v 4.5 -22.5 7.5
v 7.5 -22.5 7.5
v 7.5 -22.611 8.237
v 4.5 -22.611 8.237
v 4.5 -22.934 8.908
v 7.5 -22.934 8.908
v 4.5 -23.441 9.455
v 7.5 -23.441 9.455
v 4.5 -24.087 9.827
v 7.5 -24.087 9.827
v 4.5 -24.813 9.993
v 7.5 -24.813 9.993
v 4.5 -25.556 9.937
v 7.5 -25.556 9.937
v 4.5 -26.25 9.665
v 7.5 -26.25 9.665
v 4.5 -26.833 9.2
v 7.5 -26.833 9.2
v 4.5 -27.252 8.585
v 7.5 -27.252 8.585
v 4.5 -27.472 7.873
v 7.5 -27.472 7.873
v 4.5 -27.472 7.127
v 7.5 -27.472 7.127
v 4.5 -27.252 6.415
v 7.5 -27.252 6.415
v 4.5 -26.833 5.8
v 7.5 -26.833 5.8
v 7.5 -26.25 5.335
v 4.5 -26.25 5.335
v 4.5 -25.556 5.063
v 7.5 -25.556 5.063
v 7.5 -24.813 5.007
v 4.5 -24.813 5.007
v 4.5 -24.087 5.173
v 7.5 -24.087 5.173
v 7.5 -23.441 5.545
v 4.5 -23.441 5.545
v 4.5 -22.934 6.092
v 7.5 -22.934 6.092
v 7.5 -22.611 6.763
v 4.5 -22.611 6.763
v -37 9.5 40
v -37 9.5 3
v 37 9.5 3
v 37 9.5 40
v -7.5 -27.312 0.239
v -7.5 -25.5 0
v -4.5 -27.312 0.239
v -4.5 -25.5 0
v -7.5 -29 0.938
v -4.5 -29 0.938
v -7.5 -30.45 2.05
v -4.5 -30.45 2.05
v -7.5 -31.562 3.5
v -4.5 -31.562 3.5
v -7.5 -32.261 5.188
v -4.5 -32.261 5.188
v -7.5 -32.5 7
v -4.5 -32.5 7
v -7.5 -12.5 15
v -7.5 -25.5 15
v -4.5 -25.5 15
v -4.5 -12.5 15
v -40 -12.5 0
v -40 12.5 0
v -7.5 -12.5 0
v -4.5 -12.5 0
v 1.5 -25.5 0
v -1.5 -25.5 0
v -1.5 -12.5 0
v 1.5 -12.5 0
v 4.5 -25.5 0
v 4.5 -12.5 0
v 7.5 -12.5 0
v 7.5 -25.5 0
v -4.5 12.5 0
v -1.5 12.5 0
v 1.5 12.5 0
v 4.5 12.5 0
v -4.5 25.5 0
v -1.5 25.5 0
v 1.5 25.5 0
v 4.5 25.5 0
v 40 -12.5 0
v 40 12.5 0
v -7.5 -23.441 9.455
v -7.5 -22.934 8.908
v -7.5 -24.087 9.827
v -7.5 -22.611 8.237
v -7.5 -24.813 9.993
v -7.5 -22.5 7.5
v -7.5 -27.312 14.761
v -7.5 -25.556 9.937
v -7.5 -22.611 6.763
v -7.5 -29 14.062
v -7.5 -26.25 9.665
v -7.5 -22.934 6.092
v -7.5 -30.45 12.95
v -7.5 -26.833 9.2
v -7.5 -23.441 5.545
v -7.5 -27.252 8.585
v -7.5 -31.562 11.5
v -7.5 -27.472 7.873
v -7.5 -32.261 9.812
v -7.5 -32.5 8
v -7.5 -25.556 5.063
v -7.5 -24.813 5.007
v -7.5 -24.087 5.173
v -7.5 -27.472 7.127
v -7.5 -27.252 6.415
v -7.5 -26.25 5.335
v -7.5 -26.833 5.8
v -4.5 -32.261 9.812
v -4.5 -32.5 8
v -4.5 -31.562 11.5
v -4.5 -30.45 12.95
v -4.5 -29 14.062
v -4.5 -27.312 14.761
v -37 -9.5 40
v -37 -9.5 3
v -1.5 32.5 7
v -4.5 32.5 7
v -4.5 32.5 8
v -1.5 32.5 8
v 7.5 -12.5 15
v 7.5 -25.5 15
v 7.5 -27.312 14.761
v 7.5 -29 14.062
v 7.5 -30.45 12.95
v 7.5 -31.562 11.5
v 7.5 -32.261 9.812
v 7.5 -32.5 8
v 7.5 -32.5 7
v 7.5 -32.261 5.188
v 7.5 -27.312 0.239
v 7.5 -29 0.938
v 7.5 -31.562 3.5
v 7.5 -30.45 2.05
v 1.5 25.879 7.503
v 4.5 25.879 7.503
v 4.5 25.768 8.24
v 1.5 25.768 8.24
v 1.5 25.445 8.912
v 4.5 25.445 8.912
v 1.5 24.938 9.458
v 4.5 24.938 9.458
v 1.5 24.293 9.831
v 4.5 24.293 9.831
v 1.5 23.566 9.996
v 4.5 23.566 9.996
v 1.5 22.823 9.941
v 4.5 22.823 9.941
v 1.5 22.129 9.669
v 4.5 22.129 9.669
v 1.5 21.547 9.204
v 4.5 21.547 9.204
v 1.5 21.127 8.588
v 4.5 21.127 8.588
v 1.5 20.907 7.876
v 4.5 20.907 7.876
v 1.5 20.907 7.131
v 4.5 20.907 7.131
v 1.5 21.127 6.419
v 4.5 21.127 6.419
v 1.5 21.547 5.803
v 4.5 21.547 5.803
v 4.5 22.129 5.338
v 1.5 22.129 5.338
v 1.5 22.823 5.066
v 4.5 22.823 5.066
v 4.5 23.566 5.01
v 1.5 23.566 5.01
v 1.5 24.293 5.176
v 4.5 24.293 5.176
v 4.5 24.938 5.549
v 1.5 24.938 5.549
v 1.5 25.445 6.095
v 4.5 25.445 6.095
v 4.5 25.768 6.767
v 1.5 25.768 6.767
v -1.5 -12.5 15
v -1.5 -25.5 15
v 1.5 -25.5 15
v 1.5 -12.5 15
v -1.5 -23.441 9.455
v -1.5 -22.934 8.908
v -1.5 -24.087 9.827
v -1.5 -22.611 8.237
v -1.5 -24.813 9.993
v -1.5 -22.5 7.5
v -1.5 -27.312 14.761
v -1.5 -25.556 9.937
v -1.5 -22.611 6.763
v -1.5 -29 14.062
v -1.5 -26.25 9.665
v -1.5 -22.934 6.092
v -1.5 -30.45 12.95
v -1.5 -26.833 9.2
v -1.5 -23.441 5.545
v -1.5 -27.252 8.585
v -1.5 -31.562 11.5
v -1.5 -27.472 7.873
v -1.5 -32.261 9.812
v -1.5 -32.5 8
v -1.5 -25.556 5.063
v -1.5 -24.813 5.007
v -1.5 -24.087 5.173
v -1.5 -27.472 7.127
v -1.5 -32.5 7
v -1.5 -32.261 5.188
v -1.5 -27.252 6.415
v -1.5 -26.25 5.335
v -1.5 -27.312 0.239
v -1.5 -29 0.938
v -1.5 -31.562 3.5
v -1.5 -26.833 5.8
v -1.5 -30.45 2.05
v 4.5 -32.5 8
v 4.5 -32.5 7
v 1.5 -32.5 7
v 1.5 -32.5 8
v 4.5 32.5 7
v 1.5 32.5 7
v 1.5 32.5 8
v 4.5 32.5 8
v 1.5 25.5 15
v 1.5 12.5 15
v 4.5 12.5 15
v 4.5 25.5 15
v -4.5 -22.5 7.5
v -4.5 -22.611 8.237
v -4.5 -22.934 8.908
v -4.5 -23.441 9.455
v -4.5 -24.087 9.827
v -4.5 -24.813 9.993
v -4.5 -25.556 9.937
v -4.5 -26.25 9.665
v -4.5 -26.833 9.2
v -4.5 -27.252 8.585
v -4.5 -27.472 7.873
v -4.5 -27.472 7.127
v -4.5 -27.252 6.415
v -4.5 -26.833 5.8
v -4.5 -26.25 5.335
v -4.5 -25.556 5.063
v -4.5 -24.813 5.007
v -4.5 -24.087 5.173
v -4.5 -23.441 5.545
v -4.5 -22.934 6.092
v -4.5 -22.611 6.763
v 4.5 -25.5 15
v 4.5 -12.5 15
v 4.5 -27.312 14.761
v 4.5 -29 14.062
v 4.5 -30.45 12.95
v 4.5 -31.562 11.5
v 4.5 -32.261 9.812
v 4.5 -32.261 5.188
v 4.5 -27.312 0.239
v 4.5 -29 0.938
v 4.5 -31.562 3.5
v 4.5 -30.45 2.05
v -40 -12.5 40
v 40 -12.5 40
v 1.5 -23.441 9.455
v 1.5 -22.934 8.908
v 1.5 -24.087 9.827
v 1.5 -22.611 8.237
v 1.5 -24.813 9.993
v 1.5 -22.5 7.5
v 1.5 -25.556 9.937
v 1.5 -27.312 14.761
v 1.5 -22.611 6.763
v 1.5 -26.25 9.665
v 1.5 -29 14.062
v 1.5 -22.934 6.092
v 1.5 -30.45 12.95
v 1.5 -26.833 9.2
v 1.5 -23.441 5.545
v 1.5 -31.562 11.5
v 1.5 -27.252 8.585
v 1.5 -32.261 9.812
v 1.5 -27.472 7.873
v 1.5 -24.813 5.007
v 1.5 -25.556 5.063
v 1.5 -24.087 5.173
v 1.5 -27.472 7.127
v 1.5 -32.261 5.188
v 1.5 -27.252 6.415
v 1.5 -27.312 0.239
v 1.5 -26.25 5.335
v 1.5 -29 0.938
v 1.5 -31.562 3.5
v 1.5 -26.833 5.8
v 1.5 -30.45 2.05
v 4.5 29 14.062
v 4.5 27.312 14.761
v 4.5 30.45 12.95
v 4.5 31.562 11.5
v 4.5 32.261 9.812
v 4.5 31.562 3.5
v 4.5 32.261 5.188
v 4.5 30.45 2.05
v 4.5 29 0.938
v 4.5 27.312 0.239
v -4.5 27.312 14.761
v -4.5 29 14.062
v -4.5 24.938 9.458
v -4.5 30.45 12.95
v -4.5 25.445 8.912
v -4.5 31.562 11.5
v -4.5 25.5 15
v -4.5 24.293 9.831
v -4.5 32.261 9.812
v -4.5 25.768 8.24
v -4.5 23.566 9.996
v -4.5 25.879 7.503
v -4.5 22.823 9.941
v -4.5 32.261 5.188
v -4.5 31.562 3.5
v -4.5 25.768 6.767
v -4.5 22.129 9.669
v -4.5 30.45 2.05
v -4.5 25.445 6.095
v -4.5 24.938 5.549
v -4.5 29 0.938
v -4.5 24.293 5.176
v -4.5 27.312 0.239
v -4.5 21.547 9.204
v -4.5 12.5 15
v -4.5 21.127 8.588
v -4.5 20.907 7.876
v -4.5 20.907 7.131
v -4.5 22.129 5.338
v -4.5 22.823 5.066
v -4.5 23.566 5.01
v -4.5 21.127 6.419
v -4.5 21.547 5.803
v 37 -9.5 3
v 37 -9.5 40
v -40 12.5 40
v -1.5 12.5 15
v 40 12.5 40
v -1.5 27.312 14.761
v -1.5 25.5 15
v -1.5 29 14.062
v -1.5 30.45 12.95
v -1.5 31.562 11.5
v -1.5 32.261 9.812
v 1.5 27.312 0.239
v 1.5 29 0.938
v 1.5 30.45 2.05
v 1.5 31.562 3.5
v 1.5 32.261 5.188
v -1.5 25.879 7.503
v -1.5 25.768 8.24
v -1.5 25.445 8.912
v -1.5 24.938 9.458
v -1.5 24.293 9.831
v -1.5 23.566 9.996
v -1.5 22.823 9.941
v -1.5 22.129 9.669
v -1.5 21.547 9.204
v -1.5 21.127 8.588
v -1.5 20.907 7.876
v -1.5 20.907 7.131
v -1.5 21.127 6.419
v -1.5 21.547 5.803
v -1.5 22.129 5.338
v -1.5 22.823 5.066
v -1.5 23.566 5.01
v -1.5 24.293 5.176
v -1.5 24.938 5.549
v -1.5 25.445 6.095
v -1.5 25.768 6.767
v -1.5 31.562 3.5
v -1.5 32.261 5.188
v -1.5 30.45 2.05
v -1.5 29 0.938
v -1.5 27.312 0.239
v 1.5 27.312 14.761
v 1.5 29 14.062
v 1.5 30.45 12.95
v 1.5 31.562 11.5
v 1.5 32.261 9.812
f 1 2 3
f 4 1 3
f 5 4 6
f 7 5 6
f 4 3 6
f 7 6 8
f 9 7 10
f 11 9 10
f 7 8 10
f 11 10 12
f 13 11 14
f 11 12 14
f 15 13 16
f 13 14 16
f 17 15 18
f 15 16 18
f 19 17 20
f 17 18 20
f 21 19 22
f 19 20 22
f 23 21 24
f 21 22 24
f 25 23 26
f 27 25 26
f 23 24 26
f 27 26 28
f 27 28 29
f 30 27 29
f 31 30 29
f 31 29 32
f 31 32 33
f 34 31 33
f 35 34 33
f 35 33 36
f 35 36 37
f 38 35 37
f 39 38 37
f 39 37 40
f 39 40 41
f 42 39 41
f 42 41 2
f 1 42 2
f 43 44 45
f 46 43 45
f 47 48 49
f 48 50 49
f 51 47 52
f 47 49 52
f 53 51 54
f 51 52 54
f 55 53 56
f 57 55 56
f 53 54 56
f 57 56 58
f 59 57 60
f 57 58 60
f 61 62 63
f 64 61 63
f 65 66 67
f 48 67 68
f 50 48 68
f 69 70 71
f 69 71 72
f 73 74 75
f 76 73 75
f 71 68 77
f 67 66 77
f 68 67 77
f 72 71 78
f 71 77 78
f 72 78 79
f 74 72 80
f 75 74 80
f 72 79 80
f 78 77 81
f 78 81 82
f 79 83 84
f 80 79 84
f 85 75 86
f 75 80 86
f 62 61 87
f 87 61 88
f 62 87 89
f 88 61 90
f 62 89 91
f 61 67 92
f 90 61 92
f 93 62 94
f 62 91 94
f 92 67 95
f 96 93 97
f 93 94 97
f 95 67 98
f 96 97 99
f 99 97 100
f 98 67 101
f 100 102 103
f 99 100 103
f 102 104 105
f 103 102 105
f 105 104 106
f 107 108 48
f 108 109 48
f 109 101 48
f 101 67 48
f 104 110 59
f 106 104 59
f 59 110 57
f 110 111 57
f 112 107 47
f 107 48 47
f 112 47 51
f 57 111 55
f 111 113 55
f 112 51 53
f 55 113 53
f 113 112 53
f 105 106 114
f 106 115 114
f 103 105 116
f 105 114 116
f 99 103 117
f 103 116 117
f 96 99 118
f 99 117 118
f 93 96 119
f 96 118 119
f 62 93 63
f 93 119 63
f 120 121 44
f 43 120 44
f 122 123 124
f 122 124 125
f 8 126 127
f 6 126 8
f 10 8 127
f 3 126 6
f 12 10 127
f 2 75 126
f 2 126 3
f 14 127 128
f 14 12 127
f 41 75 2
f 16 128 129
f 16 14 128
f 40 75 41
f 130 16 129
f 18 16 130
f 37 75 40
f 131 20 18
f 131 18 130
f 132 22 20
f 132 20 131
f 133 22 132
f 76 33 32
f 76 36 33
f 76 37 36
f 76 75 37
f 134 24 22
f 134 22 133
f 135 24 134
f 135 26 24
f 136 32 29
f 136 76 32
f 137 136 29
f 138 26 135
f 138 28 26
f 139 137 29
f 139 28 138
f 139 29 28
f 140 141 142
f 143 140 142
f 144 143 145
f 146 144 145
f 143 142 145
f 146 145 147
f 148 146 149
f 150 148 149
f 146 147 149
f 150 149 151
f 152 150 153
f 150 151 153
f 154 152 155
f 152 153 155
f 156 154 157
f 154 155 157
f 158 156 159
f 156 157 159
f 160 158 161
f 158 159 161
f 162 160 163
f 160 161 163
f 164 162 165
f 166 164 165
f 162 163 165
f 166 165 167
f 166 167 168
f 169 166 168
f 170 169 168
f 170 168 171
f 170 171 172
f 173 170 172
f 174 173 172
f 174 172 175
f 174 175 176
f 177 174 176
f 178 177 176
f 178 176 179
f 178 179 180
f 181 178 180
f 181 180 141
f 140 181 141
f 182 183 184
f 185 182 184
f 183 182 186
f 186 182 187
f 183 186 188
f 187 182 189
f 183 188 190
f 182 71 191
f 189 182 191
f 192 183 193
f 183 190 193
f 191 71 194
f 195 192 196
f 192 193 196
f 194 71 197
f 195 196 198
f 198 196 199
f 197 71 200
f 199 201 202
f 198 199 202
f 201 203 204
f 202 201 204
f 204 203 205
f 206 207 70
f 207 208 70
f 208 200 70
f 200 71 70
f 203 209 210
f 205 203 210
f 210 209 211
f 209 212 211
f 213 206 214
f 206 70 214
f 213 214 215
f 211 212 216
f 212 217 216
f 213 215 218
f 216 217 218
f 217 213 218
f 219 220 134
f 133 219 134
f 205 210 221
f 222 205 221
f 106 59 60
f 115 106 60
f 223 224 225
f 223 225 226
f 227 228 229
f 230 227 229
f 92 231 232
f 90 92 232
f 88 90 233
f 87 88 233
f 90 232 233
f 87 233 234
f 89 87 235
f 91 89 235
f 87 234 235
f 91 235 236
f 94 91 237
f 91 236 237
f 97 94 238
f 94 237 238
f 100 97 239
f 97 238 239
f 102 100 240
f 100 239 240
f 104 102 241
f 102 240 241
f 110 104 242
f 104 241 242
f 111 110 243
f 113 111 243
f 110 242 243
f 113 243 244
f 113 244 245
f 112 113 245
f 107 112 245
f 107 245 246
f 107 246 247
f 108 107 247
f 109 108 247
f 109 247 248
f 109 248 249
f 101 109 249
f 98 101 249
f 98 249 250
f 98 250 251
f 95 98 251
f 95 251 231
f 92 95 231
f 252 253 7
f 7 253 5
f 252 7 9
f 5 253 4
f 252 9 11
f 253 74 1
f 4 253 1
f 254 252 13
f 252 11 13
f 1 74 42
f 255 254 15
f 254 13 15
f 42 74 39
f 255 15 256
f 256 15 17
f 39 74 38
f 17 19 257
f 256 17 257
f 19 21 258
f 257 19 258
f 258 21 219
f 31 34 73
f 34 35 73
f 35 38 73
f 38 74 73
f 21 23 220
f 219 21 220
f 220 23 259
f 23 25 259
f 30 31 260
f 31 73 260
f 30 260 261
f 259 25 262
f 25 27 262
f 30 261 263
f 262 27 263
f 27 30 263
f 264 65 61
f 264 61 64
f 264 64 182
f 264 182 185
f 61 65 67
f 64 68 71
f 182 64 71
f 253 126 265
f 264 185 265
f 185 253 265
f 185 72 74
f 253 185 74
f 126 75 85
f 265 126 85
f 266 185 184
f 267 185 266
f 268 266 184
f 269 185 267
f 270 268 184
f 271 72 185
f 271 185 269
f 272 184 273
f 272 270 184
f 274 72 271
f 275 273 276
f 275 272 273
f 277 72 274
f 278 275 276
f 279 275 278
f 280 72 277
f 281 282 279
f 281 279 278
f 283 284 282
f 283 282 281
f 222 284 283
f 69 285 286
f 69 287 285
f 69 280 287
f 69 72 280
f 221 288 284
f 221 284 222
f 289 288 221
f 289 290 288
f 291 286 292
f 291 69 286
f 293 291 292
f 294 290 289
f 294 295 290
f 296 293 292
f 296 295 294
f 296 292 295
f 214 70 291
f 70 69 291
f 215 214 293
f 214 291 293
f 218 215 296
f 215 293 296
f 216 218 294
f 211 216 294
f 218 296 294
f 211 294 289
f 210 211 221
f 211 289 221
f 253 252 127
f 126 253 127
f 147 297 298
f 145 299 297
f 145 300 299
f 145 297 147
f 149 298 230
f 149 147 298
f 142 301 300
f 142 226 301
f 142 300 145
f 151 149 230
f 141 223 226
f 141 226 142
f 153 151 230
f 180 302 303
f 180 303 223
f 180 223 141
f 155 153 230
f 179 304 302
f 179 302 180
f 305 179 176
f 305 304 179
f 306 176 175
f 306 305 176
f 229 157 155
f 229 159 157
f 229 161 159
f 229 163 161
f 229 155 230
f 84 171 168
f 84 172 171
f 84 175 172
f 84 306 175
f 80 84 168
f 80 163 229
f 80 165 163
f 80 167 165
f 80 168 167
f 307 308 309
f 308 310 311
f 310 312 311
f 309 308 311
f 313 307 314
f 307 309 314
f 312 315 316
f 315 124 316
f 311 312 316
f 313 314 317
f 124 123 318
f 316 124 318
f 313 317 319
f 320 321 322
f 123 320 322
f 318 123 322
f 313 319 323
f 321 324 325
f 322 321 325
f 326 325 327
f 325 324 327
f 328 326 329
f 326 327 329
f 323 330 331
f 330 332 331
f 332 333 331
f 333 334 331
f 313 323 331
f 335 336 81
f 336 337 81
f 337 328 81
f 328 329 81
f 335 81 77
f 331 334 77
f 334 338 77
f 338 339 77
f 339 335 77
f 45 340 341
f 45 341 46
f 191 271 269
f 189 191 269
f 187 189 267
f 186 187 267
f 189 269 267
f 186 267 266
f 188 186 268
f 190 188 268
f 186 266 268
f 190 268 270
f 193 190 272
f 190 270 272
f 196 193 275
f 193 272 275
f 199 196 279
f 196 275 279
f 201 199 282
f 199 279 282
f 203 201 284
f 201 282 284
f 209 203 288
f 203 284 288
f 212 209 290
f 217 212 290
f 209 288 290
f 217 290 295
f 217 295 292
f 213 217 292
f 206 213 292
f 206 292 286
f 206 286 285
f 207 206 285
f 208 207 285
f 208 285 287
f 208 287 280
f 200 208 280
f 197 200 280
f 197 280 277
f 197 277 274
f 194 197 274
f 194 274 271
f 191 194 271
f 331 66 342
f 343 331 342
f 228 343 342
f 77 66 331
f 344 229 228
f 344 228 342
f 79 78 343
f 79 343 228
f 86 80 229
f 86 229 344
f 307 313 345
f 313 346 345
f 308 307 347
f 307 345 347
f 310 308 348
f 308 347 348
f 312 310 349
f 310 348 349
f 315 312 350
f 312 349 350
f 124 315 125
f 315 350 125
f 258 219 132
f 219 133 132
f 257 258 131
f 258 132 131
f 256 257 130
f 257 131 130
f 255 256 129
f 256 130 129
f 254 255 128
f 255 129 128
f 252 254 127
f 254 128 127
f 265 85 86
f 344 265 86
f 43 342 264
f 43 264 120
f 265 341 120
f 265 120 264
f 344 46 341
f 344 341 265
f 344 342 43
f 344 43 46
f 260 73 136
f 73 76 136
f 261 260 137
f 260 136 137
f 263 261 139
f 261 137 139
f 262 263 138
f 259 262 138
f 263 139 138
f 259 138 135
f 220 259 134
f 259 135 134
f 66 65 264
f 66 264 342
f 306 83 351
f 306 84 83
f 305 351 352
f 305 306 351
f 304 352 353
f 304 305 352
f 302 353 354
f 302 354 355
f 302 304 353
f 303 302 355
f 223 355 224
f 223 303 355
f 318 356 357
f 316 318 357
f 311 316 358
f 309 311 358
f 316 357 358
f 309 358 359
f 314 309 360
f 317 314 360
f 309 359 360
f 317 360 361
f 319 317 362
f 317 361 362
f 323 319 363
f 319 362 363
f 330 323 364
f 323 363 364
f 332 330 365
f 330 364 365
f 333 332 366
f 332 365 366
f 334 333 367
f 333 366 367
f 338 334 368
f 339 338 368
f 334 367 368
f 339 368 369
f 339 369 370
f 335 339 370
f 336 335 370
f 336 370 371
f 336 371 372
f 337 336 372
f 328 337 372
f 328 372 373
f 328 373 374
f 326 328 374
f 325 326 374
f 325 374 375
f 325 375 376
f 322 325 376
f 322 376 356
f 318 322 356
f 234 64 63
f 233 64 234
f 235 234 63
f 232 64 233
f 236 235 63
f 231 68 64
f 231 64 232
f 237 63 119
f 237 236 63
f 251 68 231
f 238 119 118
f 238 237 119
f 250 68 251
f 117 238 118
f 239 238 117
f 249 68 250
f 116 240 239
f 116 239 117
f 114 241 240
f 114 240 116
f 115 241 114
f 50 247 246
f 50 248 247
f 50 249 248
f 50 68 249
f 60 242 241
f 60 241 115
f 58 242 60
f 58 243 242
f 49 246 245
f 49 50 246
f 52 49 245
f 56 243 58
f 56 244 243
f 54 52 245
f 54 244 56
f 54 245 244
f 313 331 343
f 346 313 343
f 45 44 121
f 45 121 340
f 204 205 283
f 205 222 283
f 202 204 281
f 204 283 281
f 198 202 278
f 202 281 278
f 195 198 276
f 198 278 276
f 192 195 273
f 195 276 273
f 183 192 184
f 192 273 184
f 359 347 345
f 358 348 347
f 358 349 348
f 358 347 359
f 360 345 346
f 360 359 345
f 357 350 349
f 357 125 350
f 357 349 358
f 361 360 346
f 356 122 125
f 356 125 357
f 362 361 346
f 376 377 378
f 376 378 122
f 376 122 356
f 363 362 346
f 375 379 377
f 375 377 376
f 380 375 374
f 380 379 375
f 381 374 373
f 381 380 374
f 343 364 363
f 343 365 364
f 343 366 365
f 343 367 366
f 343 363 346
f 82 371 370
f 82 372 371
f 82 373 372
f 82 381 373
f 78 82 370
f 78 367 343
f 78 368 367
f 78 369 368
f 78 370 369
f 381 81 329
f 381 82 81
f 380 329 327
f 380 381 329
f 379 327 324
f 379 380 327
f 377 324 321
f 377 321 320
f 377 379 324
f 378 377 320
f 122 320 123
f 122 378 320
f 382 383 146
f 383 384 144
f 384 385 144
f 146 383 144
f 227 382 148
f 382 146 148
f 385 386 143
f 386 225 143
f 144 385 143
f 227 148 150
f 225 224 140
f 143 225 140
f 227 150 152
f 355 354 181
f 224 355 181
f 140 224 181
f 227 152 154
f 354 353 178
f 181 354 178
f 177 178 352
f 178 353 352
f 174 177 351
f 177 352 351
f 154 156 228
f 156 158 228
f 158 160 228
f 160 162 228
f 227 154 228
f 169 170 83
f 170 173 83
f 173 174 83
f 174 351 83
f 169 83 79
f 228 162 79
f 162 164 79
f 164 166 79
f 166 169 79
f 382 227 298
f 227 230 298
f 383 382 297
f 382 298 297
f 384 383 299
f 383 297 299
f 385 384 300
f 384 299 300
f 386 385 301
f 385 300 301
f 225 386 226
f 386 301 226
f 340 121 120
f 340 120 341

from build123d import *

# Parameters (mm, degrees)
F0_W          = 80
F0_H          = 25
F1_DEPTH      = 40
F2_W          = 3
F2_H          = 20
F3_DEPTH      = 15
F4_R          = 7
F5_R          = 7
F7_D          = 5
F9_D          = 5
F10_T         = 3
F10_T3_DEPTH  = 21
F10_T5_DEPTH  = 9
F10_T7_DEPTH  = 9
F10_T9_DEPTH  = 9
F10_T11_DEPTH = 9
F10_T13_DEPTH = 9


# Not quite as in the source:
# - a shell that OpenCascade refuses in one call is made with other operations: the cavity is built on its own and cut out


with BuildPart() as f1:
    # F0 (on Top) → F1 (new body)
    with BuildSketch(Plane.XY):
        Rectangle(F0_W, F0_H)
    extrude(amount=F1_DEPTH)

    # F2 (on face) → F3 (join)
    with BuildSketch(Plane(origin=(0, 0, 0), x_dir=(1, 0, 0), z_dir=(0, 0, -1))):
        with Locations((-6, 22.5)):
            Rectangle(F2_W, F2_H)
        with Locations((0, 22.5)):
            Rectangle(F2_W, F2_H)
        with Locations((6, 22.5)):
            Rectangle(F2_W, F2_H)
        with Locations((3, -22.5)):
            Rectangle(F2_W, F2_H)
        with Locations((-3, -22.5)):
            Rectangle(F2_W, F2_H)
    extrude(amount=-F3_DEPTH)

    # F4
    f4_edges = [f1.edges().sort_by_distance(p)[0] for p in [
        (3, 32.5, 0),
        (-3, 32.5, 0),
        (-3, 32.5, 15),
        (3, 32.5, 15),
    ]]
    fillet(f4_edges, radius=F4_R)

    # F5
    f5_edges = [f1.edges().sort_by_distance(p)[0] for p in [
        (-6, -32.5, 15),
        (0, -32.5, 15),
        (6, -32.5, 15),
        (6, -32.5, 0),
        (0, -32.5, 0),
        (-6, -32.5, 0),
    ]]
    fillet(f5_edges, radius=F5_R)

    # F7 (through all)
    with Locations(Plane(origin=(-7.5, 0, 0), x_dir=(0, -1, 0), z_dir=(-1, 0, 0))):
        with Locations((25, 7.5)):
            Hole(F7_D / 2)

    # F9 (through all)
    with Locations(Plane(origin=(-4.5, 0, 0), x_dir=(0, -1, 0), z_dir=(-1, 0, 0))):
        with Locations((-23.3794022352, 7.5034750625)):
            Hole(F9_D / 2)

    # F10: shell of thickness 3, made by hand


with BuildPart() as f10_core1:
    # F10_t2: copy of F1
    add(f1.part)

    # the walls: a layer under each face that stays
    f10_faces = [f10_core1.faces().sort_by_distance(p)[0] for p in [
        (0, 0, 0),
        (7.5, -15.8333333333, 12.5),
        (6, -30.4497474683, 2.0502525317),
        (0, -12.5, 20),
        (4.5, -29.1666666667, 12.5),
        (40, 0, 20),
        (0, 12.5, 20),
        (1.5, -15.8333333333, 12.5),
        (4.5, 29.1666666667, 12.5),
        (0, -30.4497474683, 2.0502525317),
        (3, 30.4497474683, 2.0502525317),
        (-1.5, -29.1666666667, 12.5),
        (1.5, 15.8333333333, 12.5),
        (-4.5, -15.8333333333, 12.5),
        (-1.5, 29.1666666667, 12.5),
        (-6, -30.4497474683, 2.0502525317),
        (-3, 30.4497474683, 2.0502525317),
        (-7.5, -29.1666666667, 12.5),
        (-4.5, 15.8333333333, 12.5),
        (-40, 0, 20),
        (6, -32.5, 7.5),
        (6, -30.4497474683, 12.9497474683),
        (6, -19, 15),
        (6, -22.5, 7.5),
        (-6, -19, 15),
        (0, -19, 15),
        (3, 19, 15),
        (-3, 19, 15),
        (0, -32.5, 7.5),
        (0, -30.4497474683, 12.9497474683),
        (0, -22.5, 7.5),
        (3, 32.5, 7.5),
        (3, 30.4497474683, 12.9497474683),
        (3, 25.8794022352, 7.5034750625),
        (-6, -32.5, 7.5),
        (-6, -30.4497474683, 12.9497474683),
        (-6, -22.5, 7.5),
        (-3, 32.5, 7.5),
        (-3, 30.4497474683, 12.9497474683),
        (-3, 25.8794022352, 7.5034750625),
    ]]
    thicken(f10_faces, amount=-F10_T, mode=Mode.SUBTRACT)

    # F10_s4 → F10_t3 (cut)
    with BuildSketch(Plane.XY.offset(-3)):
        Polygon((7.53, -12.53), (4.5, -12.5), (4.5, -9.5), (7.5, -9.5), align=None)
        Polygon((-7.53, -12.53), (-7.5, -9.5), (-4.5, -9.5), (-4.5, -12.5), align=None)
        Polygon((-4.47, -12.53), (-4.5, -9.5), (-7.5, -9.5), (-7.5, -12.5), align=None)
        Polygon((-1.53, -12.53), (-1.5, -9.5), (1.5, -9.5), (1.5, -12.5), align=None)
        Polygon((1.53, -12.53), (1.5, -9.5), (-1.5, -9.5), (-1.5, -12.5), align=None)
        Polygon((4.47, -12.53), (4.5, -9.5), (7.5, -9.5), (7.5, -12.5), align=None)
        Polygon((4.53, 12.53), (4.5, 9.5), (1.5, 9.5), (1.5, 12.5), align=None)
        Polygon((1.47, 12.53), (1.5, 9.5), (4.5, 9.5), (4.5, 12.5), align=None)
        Polygon((-1.47, 12.53), (-1.5, 9.5), (-4.5, 9.5), (-4.5, 12.5), align=None)
        Polygon((-4.53, 12.53), (-4.5, 9.5), (-1.5, 9.5), (-1.5, 12.5), align=None)
    extrude(amount=F10_T3_DEPTH, mode=Mode.SUBTRACT)

    # F10_s6 → F10_t5 (cut)
    with BuildSketch(Plane.YZ.offset(-10.5)):
        Polygon((-12.53, 15.03), (-9.5, 15), (-9.5, 12), (-12.5, 12), align=None)
    extrude(amount=F10_T5_DEPTH, mode=Mode.SUBTRACT)

    # F10_s8 → F10_t7 (cut)
    with BuildSketch(Plane.YZ.offset(-4.5)):
        Polygon((-12.53, 15.03), (-9.5, 15), (-9.5, 12), (-12.5, 12), align=None)
    extrude(amount=F10_T7_DEPTH, mode=Mode.SUBTRACT)

    # F10_s10 → F10_t9 (cut)
    with BuildSketch(Plane.YZ.offset(1.5)):
        Polygon((-12.53, 15.03), (-9.5, 15), (-9.5, 12), (-12.5, 12), align=None)
    extrude(amount=F10_T9_DEPTH, mode=Mode.SUBTRACT)

    # F10_s12 → F10_t11 (cut)
    with BuildSketch(Plane.YZ.offset(-1.5)):
        Polygon((12.53, 15.03), (9.5, 15), (9.5, 12), (12.5, 12), align=None)
    extrude(amount=F10_T11_DEPTH, mode=Mode.SUBTRACT)

    # F10_s14 → F10_t13 (cut)
    with BuildSketch(Plane.YZ.offset(-7.5)):
        Polygon((12.53, 15.03), (9.5, 15), (9.5, 12), (12.5, 12), align=None)
    extrude(amount=F10_T13_DEPTH, mode=Mode.SUBTRACT)


with BuildPart() as f1_1:
    add(f1.part)

    # what is left inside the walls is the cavity
    f10_cavity = [f10_core1.part.solids().sort_by_distance(p)[0] for p in [
        (0, 9.47, 27.666667),
    ]]
    add(f10_cavity, mode=Mode.SUBTRACT)


solid = f1_1.part
